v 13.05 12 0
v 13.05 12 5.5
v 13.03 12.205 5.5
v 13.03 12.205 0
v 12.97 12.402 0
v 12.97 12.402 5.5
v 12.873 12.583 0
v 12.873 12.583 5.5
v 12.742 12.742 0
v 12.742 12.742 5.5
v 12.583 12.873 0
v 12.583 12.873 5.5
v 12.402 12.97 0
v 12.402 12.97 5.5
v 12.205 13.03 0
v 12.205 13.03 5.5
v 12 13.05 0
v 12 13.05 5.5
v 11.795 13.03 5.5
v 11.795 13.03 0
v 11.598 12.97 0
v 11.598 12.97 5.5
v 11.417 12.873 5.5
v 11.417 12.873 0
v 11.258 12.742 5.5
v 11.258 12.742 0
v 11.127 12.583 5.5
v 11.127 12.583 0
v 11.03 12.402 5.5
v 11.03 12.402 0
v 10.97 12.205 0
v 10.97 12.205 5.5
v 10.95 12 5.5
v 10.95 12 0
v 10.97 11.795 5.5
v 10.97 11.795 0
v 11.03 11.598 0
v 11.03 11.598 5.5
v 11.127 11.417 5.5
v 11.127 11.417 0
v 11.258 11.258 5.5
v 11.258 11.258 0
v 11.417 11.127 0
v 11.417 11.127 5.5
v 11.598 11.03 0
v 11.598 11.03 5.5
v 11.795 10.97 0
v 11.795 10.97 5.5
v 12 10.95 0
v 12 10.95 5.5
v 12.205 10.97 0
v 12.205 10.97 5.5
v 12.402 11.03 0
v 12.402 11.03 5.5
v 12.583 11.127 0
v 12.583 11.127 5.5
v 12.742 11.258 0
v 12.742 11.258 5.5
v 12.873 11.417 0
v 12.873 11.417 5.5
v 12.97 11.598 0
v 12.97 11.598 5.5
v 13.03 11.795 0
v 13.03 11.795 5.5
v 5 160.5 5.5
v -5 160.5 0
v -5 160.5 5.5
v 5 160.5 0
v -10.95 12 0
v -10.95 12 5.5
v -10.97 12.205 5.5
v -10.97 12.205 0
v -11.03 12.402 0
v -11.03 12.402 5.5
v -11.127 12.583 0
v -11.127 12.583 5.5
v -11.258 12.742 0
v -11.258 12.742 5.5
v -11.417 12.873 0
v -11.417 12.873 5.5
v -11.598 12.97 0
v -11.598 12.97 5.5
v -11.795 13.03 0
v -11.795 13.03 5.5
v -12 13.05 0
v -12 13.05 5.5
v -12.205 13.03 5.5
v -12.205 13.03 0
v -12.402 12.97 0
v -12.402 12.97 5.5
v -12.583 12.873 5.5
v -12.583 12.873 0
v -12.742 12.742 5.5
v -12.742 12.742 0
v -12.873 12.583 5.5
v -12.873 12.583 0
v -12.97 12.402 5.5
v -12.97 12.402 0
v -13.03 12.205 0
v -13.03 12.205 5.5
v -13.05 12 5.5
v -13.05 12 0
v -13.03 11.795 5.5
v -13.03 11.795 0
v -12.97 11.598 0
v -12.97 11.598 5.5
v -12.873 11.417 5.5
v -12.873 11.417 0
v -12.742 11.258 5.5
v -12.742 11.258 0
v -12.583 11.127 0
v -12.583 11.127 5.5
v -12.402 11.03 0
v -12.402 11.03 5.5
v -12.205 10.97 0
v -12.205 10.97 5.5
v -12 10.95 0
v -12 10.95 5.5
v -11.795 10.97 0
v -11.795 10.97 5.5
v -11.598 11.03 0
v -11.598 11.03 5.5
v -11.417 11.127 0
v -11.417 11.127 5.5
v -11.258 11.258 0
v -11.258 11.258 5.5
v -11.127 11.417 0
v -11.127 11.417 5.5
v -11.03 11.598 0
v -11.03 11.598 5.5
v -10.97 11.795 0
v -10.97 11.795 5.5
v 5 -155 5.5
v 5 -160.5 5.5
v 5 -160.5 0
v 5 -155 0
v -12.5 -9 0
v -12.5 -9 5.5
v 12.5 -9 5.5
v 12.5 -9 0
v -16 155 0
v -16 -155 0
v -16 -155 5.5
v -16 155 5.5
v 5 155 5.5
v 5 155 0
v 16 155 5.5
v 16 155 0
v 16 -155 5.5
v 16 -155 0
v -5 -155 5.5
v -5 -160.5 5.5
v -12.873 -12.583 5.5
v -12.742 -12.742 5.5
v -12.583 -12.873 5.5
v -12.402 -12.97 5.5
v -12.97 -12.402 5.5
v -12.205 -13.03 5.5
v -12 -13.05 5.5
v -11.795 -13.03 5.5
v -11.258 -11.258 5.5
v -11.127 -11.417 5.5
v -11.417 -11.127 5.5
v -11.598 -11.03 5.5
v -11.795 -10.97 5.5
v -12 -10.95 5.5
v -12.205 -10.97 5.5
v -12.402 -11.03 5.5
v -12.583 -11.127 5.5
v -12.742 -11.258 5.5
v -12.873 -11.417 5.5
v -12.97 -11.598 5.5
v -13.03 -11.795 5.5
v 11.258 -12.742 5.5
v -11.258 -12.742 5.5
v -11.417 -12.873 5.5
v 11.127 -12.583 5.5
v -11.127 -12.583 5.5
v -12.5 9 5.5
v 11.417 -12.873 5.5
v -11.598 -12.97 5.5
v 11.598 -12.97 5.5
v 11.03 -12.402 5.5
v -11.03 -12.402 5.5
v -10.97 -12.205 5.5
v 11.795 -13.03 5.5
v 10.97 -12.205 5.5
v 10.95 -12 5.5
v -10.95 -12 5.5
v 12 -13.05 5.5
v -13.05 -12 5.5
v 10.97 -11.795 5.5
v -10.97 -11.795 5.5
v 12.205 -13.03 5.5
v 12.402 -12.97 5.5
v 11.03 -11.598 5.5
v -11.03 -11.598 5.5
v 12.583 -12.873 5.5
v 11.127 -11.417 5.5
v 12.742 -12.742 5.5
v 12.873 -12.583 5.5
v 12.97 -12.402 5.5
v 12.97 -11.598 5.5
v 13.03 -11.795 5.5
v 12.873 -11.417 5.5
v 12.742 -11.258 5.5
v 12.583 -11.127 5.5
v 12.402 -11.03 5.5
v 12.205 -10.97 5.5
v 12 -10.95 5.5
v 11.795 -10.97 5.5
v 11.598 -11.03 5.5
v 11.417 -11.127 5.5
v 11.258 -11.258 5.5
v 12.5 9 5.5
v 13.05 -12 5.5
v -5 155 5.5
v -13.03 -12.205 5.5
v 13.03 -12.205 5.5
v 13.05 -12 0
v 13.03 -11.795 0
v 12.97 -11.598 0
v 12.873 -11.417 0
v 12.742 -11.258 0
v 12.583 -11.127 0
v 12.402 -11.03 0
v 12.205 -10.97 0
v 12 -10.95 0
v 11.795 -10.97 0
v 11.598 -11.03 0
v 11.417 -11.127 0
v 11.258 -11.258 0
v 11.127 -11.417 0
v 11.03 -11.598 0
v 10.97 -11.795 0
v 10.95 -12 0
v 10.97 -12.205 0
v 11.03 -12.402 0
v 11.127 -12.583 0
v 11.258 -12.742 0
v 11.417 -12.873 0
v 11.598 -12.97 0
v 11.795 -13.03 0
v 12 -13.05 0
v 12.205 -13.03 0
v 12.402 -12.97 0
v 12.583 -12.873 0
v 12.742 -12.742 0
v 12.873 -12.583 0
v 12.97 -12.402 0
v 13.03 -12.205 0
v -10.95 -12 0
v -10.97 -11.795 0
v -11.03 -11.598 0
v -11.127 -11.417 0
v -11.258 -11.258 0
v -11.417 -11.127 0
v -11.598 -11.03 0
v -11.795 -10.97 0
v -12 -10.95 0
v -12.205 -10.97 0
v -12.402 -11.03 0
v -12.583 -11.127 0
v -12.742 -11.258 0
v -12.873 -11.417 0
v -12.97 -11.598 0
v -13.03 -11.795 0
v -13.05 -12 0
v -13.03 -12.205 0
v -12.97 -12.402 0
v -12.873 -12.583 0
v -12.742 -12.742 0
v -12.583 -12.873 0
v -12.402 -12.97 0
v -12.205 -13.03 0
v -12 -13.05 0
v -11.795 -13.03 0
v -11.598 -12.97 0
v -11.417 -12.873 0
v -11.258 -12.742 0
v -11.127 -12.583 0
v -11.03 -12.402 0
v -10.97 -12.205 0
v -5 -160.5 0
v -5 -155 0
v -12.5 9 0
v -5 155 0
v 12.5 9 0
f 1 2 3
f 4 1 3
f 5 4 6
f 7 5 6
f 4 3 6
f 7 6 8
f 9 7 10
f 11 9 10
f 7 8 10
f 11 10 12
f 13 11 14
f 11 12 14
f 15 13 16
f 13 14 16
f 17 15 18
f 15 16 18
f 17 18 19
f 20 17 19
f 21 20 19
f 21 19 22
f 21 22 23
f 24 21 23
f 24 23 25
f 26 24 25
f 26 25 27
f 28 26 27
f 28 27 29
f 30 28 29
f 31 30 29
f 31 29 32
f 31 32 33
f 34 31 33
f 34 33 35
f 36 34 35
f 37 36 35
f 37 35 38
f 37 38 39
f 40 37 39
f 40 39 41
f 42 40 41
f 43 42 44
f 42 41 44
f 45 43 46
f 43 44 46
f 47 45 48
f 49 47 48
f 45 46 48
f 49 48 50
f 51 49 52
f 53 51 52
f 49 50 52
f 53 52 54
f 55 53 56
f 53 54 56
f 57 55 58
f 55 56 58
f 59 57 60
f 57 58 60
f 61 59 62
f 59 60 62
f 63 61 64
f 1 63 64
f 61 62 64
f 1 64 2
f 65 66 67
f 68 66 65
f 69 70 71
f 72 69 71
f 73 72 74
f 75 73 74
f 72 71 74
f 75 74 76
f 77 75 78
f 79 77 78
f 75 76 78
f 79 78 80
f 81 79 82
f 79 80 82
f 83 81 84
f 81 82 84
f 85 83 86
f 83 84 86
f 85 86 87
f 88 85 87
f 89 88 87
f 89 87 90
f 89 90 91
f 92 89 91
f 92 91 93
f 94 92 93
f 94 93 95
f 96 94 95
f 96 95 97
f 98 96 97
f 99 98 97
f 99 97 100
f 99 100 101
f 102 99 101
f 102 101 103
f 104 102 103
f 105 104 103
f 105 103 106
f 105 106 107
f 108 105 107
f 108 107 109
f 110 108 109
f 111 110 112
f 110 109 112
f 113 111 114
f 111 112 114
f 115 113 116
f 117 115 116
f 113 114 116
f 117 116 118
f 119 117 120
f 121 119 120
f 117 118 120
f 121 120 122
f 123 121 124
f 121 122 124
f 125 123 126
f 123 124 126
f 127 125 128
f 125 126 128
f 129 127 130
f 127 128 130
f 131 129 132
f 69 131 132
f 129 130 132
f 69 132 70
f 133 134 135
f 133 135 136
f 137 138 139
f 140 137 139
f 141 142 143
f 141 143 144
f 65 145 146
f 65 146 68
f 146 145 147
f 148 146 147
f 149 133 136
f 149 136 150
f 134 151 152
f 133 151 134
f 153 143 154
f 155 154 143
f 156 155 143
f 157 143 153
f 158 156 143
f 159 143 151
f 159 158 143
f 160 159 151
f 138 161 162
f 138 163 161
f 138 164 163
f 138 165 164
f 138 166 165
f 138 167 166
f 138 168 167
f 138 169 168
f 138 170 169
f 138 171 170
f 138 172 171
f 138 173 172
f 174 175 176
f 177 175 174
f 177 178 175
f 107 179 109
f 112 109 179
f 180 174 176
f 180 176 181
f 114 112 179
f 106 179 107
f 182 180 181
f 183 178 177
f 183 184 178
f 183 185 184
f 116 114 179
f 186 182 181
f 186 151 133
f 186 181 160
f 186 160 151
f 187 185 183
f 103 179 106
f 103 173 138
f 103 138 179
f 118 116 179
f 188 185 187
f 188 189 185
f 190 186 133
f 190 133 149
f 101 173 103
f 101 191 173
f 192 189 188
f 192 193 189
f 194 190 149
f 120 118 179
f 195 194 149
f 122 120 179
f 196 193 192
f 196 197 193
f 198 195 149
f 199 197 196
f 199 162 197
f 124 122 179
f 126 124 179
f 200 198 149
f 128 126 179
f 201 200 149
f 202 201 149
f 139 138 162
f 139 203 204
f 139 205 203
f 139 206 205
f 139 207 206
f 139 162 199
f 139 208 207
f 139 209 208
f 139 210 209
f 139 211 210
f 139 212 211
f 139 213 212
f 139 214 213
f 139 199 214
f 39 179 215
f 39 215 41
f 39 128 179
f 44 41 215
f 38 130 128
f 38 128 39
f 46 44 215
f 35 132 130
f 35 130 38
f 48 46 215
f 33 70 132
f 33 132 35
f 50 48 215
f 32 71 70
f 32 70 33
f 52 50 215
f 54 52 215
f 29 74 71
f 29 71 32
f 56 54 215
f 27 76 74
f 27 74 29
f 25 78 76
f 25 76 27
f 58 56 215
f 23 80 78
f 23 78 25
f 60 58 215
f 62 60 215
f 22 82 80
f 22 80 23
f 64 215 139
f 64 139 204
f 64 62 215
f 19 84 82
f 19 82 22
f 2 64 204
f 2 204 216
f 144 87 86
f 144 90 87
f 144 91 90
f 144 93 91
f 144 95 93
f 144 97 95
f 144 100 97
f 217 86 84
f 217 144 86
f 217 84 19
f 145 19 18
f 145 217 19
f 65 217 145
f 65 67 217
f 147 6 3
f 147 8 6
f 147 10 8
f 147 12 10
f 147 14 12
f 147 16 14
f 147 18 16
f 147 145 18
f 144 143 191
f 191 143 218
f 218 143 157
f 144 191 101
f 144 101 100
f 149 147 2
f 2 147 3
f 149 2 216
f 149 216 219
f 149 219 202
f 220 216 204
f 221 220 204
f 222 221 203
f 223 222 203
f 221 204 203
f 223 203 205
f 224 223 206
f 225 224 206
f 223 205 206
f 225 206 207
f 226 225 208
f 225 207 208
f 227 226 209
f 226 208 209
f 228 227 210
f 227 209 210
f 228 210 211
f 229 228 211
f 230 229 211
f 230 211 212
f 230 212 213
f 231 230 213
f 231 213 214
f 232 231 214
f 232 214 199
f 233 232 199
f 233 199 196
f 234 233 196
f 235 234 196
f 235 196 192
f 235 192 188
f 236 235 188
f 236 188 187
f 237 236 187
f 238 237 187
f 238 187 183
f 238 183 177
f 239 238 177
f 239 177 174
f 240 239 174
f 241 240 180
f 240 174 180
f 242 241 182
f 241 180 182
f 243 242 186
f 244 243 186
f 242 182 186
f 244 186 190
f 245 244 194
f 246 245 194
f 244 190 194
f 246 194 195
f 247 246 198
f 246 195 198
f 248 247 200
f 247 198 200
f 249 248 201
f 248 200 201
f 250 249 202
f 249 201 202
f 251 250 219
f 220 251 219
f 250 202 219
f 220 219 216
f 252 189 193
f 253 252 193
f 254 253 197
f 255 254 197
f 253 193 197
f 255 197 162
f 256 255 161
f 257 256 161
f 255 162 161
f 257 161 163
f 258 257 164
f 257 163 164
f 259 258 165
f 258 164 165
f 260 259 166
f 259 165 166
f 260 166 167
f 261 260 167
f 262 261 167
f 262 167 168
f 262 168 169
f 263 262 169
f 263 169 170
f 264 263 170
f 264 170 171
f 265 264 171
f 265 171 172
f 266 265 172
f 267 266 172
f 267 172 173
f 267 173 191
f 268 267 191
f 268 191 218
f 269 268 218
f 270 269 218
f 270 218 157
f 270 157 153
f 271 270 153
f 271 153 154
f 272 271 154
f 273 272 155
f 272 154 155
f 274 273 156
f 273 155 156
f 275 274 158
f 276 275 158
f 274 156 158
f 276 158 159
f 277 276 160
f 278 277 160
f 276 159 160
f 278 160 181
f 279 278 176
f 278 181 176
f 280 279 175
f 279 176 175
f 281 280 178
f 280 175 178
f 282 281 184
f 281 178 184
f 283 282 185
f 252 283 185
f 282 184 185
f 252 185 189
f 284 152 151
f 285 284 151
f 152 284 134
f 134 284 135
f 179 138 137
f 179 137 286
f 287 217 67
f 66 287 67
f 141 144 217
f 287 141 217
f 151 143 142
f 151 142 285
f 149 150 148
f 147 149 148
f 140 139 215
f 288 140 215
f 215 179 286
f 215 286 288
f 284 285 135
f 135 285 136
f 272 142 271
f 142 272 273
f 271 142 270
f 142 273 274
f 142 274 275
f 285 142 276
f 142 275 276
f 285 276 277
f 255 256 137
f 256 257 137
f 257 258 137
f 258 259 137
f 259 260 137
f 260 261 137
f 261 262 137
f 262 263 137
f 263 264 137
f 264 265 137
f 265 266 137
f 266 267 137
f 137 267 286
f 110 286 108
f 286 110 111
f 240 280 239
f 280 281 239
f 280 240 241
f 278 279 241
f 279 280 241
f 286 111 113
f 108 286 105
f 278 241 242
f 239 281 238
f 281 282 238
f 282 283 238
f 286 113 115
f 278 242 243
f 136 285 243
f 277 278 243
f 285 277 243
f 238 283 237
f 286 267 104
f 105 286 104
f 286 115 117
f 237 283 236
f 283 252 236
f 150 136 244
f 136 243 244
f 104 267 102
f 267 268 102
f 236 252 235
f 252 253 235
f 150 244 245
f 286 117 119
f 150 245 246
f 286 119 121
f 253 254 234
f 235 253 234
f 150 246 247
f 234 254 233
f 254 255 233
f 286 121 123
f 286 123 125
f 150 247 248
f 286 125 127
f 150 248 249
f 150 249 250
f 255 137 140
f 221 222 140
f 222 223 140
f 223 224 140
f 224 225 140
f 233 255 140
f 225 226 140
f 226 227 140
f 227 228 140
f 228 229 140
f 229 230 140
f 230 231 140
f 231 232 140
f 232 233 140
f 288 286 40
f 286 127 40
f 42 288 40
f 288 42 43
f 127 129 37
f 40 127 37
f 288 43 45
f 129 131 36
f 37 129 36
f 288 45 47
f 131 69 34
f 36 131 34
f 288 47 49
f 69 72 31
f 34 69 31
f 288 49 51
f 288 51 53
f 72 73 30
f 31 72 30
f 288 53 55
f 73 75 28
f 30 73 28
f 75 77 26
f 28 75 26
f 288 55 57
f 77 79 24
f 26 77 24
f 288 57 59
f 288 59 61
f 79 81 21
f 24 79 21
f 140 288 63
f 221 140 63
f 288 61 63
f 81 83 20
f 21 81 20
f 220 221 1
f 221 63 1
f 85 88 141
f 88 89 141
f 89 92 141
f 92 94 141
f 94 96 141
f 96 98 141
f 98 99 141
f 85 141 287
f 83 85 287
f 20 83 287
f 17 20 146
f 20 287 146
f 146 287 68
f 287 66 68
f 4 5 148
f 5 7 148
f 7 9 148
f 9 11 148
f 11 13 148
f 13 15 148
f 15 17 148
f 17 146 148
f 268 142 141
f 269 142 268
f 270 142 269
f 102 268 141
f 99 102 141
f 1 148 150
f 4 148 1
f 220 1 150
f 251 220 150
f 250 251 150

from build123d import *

# Parameters (mm, degrees)
SKETCH_1_W          = 32
SKETCH_1_H          = 321
EXTRUDE_1_DEPTH     = 5.5
SKETCH_2_R          = 1.05
SKETCH_2_W          = 25
SKETCH_2_H          = 18
CUT_EXTRUDE_1_DEPTH = 162.389280933
SKETCH_3_W          = 11
SKETCH_3_H          = 5.5
CUT_EXTRUDE_2_DEPTH = 162.389280933


with BuildPart() as part:
    # ｽｹｯﾁ1 → ﾎﾞｽ - 押し出し1 (new body)
    with BuildSketch(Plane.XY):
        Rectangle(SKETCH_1_W, SKETCH_1_H)
    extrude(amount=EXTRUDE_1_DEPTH)

    # ｽｹｯﾁ2 → ｶｯﾄ - 押し出し1 (cut, through all)
    with BuildSketch(Plane.XY.offset(5.5)):
        with Locations((12, 12)):
            Circle(SKETCH_2_R)
        with Locations((12, -12)):
            Circle(SKETCH_2_R)
        with Locations((-12, 12)):
            Circle(SKETCH_2_R)
        with Locations((-12, -12)):
            Circle(SKETCH_2_R)
        Rectangle(SKETCH_2_W, SKETCH_2_H)
    extrude(amount=-CUT_EXTRUDE_1_DEPTH, mode=Mode.SUBTRACT)

    # ｽｹｯﾁ3 → ｶｯﾄ - 押し出し2 (cut, through all)
    with BuildSketch(Plane.XY.offset(5.5)):
        with Locations((-10.5, 157.75)):
            Rectangle(SKETCH_3_W, SKETCH_3_H)
        with Locations((10.5, 157.75)):
            Rectangle(SKETCH_3_W, SKETCH_3_H)
        with Locations((10.5, -157.75)):
            Rectangle(SKETCH_3_W, SKETCH_3_H)
        with Locations((-10.5, -157.75)):
            Rectangle(SKETCH_3_W, SKETCH_3_H)
    extrude(amount=-CUT_EXTRUDE_2_DEPTH, mode=Mode.SUBTRACT)


solid = part.part
